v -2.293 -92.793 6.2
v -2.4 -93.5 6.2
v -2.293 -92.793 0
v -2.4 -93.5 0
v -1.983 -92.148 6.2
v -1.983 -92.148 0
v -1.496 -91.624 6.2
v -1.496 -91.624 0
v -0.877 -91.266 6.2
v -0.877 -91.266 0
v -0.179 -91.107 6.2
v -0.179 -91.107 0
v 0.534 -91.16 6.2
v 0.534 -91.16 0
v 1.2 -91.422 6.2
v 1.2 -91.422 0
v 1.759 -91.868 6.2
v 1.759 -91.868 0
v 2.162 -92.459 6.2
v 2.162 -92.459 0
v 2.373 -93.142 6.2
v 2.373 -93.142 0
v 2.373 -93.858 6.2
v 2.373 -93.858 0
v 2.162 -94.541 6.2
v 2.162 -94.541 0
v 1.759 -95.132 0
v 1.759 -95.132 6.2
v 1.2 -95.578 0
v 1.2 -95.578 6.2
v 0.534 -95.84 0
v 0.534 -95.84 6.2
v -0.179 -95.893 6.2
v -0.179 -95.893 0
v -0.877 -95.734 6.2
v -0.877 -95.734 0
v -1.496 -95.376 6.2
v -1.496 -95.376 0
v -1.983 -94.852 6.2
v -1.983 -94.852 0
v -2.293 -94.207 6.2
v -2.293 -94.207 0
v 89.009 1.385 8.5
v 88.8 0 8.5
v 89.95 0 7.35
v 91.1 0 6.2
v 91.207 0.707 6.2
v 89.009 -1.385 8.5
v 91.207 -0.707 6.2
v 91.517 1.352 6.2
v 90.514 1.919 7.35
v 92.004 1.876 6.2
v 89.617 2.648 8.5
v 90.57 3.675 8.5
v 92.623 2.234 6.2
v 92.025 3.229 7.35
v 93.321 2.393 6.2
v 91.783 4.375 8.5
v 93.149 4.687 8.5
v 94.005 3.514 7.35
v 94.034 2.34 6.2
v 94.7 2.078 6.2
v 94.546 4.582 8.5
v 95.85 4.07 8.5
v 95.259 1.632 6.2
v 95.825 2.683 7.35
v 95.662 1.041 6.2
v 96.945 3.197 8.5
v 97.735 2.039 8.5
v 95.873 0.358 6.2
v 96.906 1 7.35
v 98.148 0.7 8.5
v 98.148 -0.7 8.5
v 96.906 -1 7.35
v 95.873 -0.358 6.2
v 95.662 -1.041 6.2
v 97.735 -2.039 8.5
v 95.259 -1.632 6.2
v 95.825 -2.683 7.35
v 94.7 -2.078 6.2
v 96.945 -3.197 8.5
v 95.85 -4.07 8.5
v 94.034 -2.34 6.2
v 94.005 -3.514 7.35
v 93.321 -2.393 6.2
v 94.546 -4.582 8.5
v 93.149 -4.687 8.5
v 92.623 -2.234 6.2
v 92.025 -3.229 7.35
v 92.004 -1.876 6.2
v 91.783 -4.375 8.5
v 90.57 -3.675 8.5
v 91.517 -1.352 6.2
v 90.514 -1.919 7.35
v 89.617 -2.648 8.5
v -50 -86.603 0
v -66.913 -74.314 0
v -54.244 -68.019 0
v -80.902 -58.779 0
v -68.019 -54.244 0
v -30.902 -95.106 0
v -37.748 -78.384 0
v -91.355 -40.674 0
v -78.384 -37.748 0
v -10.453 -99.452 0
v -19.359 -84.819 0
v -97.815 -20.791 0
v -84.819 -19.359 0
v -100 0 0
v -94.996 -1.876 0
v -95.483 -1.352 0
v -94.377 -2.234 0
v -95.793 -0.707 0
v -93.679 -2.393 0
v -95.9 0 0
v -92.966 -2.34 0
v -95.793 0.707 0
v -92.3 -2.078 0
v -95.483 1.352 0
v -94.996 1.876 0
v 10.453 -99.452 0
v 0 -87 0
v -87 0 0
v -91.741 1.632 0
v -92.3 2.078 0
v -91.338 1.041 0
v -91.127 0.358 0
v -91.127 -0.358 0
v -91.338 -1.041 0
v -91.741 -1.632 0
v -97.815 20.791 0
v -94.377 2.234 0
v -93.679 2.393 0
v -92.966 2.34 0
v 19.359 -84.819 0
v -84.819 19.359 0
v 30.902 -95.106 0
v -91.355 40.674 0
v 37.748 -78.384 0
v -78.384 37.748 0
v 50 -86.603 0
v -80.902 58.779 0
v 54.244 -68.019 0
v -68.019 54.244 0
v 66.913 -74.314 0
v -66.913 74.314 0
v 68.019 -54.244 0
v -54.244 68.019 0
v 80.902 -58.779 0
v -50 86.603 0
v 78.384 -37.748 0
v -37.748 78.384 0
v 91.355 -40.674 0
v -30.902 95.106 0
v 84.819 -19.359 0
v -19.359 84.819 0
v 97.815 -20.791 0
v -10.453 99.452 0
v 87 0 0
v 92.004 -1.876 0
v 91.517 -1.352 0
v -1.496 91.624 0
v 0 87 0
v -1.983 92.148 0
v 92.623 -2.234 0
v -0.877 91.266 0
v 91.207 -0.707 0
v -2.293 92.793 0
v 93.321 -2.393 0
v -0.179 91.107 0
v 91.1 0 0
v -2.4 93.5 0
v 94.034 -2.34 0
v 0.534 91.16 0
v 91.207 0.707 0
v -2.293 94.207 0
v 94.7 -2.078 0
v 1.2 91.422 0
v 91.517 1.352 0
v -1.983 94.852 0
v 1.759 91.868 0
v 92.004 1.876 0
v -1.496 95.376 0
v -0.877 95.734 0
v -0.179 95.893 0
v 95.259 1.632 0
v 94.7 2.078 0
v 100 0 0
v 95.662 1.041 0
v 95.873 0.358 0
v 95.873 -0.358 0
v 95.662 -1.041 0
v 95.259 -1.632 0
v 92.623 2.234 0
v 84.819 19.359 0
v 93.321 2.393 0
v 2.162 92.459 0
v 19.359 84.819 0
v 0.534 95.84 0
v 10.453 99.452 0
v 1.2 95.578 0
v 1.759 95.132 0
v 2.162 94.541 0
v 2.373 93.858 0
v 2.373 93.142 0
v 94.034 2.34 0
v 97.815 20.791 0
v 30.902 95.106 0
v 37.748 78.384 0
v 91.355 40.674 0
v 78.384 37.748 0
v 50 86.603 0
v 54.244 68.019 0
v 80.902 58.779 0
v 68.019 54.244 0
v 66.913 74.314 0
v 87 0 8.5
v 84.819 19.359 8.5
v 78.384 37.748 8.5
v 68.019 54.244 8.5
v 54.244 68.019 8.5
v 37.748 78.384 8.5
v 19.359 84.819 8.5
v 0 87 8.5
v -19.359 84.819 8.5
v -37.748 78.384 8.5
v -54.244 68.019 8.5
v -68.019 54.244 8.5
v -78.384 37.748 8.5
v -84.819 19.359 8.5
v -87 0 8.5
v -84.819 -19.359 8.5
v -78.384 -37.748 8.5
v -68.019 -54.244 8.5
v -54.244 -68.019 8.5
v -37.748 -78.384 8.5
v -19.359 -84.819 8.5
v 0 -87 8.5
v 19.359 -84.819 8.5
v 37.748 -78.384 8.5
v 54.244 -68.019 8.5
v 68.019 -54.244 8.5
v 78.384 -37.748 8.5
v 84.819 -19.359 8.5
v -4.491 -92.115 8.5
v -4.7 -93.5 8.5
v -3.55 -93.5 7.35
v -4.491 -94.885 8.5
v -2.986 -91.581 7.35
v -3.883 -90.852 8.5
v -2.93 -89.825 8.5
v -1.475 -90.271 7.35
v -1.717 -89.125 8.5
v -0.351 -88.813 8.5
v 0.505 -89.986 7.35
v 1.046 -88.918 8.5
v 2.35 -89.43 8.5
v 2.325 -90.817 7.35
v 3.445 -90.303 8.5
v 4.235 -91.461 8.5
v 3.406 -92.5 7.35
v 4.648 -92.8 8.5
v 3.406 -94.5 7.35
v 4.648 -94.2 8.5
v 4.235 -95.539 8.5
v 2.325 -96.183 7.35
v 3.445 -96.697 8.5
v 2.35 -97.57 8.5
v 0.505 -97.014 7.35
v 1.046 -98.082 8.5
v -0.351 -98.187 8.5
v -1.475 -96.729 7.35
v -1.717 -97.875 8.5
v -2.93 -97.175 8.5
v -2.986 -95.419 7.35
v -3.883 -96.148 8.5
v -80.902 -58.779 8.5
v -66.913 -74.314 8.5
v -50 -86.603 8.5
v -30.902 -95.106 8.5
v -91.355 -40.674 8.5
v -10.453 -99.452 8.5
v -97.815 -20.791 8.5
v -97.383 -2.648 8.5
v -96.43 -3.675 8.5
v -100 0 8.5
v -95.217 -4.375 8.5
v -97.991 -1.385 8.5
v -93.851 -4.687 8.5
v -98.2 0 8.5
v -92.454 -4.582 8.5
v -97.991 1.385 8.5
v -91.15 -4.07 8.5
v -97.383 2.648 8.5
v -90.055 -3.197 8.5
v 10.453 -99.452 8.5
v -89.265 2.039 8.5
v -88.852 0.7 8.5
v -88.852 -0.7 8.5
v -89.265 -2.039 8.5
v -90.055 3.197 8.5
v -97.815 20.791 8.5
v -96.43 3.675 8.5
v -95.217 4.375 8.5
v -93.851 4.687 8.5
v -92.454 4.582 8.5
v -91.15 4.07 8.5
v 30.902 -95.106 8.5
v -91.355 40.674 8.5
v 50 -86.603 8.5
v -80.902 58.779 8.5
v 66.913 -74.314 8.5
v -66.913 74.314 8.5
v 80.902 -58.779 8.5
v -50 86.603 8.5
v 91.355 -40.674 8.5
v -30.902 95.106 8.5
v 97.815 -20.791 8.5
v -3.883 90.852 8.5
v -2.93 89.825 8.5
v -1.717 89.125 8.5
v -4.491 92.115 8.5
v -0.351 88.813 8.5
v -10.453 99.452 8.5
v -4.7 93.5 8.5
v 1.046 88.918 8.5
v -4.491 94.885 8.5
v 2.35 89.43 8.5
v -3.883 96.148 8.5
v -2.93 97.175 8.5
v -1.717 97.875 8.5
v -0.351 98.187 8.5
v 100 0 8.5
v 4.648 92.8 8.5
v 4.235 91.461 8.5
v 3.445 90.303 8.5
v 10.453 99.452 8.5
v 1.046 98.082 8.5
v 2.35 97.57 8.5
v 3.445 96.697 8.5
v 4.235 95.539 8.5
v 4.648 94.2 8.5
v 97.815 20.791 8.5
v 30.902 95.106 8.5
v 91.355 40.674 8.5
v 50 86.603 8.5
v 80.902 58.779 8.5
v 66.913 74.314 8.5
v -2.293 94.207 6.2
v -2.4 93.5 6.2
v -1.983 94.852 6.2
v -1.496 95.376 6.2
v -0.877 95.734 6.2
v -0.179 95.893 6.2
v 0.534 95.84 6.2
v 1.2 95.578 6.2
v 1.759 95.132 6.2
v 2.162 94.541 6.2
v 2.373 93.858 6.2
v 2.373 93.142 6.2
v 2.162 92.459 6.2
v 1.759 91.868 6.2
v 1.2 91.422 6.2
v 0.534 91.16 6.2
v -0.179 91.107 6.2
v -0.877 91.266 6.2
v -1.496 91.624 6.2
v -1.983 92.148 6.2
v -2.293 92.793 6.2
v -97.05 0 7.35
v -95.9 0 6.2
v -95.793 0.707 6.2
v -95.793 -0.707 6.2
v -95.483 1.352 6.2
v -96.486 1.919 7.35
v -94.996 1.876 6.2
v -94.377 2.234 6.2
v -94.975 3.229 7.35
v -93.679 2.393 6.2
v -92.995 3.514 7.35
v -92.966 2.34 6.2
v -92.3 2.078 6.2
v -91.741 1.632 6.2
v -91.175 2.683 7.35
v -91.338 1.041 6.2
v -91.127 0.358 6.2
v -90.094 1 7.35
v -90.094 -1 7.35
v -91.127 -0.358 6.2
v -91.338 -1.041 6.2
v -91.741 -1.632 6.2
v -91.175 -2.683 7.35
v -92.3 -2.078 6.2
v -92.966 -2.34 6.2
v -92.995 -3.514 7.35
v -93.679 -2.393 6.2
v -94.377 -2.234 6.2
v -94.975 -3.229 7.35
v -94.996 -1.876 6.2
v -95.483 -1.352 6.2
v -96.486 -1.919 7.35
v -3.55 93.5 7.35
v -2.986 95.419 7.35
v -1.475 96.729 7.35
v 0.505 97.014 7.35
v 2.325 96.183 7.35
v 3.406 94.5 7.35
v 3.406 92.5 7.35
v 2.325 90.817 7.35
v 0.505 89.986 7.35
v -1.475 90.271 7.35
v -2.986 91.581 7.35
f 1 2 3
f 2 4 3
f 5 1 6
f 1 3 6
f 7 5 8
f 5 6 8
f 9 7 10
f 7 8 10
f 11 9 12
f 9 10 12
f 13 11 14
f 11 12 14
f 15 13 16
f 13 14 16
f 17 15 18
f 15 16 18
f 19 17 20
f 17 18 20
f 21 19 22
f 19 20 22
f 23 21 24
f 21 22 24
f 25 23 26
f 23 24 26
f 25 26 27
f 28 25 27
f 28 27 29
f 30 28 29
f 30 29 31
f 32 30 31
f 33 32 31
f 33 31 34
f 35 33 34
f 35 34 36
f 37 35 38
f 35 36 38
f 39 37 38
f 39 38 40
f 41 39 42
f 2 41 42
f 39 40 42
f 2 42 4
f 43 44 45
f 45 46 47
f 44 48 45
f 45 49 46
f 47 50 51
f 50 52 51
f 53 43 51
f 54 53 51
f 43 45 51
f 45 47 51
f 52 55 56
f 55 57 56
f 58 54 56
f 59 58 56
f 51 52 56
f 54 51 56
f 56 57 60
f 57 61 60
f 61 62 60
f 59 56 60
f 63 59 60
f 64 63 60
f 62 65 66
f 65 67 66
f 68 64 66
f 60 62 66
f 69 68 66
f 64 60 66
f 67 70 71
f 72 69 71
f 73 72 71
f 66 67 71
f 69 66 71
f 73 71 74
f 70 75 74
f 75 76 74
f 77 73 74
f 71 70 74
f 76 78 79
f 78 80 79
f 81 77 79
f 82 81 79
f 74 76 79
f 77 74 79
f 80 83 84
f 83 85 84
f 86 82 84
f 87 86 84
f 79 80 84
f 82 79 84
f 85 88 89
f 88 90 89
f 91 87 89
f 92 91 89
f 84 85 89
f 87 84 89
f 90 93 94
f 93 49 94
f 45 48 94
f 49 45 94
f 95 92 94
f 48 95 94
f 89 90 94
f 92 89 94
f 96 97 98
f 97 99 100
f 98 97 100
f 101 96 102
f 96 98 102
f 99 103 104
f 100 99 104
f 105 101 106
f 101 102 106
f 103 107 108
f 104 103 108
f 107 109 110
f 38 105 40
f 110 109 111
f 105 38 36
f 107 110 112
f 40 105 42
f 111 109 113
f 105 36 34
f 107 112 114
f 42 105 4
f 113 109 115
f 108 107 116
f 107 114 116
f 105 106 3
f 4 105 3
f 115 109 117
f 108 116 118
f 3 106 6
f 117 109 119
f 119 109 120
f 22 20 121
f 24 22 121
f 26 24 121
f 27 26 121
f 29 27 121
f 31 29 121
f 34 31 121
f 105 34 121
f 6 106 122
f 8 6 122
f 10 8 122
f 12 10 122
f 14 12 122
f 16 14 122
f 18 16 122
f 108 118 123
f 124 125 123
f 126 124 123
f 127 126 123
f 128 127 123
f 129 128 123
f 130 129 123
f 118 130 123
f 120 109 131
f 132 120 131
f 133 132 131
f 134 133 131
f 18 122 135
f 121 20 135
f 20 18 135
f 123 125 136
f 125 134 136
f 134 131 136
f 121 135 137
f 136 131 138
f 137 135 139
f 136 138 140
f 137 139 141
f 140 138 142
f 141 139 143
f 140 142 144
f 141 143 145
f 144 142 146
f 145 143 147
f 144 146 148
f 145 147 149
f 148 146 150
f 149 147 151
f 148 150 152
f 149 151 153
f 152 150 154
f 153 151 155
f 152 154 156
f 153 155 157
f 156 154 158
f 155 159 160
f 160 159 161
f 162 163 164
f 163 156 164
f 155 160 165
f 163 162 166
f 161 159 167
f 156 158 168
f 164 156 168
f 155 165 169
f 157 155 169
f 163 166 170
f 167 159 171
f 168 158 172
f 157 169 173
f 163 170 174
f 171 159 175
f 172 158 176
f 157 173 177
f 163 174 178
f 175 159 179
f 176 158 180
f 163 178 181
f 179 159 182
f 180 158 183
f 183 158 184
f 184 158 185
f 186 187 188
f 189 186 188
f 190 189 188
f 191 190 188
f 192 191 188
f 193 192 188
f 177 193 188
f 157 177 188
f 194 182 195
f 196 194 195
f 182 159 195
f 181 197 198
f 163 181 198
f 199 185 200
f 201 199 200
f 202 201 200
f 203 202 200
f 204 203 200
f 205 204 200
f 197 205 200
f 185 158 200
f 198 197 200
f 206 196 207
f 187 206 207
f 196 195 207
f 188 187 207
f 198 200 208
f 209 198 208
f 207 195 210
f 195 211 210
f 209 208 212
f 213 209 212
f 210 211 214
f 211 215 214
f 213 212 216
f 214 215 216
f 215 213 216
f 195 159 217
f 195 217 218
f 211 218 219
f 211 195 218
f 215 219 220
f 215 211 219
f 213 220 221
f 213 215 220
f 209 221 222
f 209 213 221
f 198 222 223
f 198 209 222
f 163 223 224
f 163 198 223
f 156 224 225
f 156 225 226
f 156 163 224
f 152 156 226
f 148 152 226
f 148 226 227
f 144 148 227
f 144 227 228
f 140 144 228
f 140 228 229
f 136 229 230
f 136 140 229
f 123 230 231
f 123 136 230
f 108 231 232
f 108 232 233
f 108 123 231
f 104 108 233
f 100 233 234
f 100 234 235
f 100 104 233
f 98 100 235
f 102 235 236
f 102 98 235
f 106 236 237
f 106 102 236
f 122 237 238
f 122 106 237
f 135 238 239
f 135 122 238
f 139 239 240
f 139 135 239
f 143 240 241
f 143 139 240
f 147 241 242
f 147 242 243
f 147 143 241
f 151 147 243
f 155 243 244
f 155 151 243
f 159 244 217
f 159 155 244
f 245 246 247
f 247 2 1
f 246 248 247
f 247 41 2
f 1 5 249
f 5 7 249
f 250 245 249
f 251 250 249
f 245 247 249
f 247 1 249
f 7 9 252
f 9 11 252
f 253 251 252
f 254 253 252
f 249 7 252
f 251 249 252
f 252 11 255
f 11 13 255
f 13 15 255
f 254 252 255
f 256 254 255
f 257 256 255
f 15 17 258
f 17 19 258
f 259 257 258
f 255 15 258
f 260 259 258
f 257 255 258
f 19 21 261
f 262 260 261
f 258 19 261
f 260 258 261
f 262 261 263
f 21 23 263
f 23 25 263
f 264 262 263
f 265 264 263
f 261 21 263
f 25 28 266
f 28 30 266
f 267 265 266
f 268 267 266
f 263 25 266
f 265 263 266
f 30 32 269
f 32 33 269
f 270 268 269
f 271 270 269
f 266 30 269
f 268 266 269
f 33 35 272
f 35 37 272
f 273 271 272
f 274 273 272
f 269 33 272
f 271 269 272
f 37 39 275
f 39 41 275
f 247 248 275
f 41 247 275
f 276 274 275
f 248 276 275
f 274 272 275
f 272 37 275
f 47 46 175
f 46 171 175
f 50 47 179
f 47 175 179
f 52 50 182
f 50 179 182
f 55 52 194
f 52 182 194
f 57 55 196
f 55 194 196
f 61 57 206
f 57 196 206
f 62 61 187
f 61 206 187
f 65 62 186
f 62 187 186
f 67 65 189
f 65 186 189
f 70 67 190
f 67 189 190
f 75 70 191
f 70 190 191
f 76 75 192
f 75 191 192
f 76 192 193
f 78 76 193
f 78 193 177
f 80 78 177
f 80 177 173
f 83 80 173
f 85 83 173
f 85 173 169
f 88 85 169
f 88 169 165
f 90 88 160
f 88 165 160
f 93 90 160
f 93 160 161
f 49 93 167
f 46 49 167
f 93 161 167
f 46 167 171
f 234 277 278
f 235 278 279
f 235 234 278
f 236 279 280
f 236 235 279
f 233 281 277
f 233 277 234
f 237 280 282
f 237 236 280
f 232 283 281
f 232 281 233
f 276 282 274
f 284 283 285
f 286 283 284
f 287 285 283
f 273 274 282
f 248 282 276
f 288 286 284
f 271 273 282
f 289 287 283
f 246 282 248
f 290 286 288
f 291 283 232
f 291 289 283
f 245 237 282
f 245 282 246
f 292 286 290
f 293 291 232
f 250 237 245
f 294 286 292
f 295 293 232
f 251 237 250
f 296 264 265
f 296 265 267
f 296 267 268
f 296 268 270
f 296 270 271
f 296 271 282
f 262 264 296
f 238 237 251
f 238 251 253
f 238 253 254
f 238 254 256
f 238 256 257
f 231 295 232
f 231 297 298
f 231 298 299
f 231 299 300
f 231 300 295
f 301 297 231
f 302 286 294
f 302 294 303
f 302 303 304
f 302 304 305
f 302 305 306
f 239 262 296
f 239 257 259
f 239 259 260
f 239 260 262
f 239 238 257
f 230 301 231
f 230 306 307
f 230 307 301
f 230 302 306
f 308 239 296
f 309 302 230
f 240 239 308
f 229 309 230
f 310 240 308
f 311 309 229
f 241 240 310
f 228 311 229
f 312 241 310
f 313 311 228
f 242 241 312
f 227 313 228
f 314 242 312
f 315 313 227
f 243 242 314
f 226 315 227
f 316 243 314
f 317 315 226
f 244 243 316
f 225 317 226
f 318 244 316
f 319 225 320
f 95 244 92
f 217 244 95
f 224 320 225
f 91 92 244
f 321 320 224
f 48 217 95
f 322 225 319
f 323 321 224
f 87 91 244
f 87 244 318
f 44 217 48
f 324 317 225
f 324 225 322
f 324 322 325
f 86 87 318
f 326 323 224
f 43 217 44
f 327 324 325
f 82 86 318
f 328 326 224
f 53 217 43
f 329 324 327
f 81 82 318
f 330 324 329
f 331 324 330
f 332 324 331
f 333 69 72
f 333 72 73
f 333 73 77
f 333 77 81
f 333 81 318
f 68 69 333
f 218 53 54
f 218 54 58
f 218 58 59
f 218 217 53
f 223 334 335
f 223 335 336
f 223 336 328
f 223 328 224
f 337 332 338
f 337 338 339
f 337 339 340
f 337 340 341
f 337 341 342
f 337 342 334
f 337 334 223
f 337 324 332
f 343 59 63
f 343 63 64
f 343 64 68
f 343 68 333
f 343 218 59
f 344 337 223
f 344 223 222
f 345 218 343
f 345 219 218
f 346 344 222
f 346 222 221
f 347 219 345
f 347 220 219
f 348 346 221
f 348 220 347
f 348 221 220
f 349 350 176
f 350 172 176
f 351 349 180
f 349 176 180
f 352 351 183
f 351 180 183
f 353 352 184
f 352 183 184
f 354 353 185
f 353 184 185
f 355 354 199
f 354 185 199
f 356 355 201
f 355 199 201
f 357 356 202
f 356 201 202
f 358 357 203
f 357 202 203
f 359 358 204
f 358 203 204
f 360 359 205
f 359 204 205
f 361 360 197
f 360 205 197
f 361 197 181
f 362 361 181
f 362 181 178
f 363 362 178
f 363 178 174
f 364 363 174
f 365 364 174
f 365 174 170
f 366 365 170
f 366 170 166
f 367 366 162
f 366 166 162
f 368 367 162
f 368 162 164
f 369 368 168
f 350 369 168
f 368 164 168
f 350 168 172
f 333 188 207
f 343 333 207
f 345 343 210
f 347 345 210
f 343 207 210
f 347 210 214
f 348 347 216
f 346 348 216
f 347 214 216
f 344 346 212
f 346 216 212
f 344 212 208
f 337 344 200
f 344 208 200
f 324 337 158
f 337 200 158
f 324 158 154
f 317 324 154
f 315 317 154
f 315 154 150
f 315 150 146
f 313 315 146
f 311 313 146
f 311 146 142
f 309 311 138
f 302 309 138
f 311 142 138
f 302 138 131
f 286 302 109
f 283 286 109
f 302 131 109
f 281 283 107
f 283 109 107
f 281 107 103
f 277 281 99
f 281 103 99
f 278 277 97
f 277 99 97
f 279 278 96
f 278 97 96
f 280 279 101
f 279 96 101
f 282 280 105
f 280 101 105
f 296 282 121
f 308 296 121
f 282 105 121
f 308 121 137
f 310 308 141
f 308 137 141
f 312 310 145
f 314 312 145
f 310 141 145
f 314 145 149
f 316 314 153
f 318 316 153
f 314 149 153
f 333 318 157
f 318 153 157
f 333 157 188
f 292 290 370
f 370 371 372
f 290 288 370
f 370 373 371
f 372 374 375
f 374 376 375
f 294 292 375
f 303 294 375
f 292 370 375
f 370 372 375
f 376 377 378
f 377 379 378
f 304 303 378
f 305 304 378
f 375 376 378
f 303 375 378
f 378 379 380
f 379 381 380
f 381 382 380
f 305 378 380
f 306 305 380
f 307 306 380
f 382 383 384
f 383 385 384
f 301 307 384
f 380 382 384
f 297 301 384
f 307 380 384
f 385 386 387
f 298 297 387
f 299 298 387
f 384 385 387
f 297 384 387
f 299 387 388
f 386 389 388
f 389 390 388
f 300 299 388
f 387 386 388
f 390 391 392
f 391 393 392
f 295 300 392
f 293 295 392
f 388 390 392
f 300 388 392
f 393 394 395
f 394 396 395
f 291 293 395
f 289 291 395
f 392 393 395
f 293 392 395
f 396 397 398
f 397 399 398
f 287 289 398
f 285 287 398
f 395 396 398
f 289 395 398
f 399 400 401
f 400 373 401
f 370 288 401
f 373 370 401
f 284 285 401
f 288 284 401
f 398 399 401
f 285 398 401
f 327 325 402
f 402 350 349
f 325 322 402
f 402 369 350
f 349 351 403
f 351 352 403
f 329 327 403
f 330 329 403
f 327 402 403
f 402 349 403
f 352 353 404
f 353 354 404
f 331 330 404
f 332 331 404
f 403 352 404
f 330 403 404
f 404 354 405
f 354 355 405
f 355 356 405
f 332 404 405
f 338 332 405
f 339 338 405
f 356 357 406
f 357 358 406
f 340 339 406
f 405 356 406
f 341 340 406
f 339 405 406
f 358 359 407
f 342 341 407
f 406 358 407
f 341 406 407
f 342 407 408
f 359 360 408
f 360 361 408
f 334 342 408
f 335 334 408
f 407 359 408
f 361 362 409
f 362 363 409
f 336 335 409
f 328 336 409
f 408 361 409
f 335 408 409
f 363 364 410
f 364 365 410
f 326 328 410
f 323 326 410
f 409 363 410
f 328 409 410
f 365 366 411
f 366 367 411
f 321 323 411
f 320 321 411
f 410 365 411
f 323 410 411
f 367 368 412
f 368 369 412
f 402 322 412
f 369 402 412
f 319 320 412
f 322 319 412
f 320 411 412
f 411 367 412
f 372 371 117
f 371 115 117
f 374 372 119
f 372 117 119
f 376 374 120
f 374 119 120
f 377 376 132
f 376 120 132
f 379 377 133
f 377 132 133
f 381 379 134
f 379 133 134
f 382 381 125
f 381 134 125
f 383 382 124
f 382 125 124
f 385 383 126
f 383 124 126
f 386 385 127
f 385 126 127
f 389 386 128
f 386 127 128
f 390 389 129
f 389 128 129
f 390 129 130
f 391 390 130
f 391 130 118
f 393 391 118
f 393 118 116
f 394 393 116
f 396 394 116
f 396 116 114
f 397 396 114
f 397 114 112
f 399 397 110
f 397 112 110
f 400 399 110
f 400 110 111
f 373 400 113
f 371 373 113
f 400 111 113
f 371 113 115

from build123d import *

# Parameters (mm, degrees)
SKETCH_1_R                   = 100
SKETCH_1_R_2                 = 87
SKETCH_1_R_3                 = 2.25
EXTRUDE_1_DEPTH              = 8.5
HOLE_WIZARD_M4_1_D           = 4.8
HOLE_WIZARD_M4_1_CSINK_D     = 9.4
HOLE_WIZARD_M4_1_CSINK_ANGLE = 90


with BuildPart() as part:
    # ｽｹｯﾁ1 → ﾎﾞｽ - 押し出し1 (new body)
    with BuildSketch(Plane.XY):
        Circle(SKETCH_1_R)
        Circle(SKETCH_1_R_2, mode=Mode.SUBTRACT)
        with Locations((0, 93.5)):
            Circle(SKETCH_1_R_3, mode=Mode.SUBTRACT)
        with Locations((93.5, 0)):
            Circle(SKETCH_1_R_3, mode=Mode.SUBTRACT)
        with Locations((0, -93.5)):
            Circle(SKETCH_1_R_3, mode=Mode.SUBTRACT)
        with Locations((-93.5, 0)):
            Circle(SKETCH_1_R_3, mode=Mode.SUBTRACT)
    extrude(amount=EXTRUDE_1_DEPTH)

    # M4 丸皿ねじ用皿穴1 (through all)
    with Locations(Plane.XY.offset(8.5)):
        with Locations((-93.5, 0), (0, 93.5), (93.5, 0), (0, -93.5)):
            CounterSinkHole(HOLE_WIZARD_M4_1_D / 2, HOLE_WIZARD_M4_1_CSINK_D / 2, counter_sink_angle=HOLE_WIZARD_M4_1_CSINK_ANGLE)


solid = part.part
